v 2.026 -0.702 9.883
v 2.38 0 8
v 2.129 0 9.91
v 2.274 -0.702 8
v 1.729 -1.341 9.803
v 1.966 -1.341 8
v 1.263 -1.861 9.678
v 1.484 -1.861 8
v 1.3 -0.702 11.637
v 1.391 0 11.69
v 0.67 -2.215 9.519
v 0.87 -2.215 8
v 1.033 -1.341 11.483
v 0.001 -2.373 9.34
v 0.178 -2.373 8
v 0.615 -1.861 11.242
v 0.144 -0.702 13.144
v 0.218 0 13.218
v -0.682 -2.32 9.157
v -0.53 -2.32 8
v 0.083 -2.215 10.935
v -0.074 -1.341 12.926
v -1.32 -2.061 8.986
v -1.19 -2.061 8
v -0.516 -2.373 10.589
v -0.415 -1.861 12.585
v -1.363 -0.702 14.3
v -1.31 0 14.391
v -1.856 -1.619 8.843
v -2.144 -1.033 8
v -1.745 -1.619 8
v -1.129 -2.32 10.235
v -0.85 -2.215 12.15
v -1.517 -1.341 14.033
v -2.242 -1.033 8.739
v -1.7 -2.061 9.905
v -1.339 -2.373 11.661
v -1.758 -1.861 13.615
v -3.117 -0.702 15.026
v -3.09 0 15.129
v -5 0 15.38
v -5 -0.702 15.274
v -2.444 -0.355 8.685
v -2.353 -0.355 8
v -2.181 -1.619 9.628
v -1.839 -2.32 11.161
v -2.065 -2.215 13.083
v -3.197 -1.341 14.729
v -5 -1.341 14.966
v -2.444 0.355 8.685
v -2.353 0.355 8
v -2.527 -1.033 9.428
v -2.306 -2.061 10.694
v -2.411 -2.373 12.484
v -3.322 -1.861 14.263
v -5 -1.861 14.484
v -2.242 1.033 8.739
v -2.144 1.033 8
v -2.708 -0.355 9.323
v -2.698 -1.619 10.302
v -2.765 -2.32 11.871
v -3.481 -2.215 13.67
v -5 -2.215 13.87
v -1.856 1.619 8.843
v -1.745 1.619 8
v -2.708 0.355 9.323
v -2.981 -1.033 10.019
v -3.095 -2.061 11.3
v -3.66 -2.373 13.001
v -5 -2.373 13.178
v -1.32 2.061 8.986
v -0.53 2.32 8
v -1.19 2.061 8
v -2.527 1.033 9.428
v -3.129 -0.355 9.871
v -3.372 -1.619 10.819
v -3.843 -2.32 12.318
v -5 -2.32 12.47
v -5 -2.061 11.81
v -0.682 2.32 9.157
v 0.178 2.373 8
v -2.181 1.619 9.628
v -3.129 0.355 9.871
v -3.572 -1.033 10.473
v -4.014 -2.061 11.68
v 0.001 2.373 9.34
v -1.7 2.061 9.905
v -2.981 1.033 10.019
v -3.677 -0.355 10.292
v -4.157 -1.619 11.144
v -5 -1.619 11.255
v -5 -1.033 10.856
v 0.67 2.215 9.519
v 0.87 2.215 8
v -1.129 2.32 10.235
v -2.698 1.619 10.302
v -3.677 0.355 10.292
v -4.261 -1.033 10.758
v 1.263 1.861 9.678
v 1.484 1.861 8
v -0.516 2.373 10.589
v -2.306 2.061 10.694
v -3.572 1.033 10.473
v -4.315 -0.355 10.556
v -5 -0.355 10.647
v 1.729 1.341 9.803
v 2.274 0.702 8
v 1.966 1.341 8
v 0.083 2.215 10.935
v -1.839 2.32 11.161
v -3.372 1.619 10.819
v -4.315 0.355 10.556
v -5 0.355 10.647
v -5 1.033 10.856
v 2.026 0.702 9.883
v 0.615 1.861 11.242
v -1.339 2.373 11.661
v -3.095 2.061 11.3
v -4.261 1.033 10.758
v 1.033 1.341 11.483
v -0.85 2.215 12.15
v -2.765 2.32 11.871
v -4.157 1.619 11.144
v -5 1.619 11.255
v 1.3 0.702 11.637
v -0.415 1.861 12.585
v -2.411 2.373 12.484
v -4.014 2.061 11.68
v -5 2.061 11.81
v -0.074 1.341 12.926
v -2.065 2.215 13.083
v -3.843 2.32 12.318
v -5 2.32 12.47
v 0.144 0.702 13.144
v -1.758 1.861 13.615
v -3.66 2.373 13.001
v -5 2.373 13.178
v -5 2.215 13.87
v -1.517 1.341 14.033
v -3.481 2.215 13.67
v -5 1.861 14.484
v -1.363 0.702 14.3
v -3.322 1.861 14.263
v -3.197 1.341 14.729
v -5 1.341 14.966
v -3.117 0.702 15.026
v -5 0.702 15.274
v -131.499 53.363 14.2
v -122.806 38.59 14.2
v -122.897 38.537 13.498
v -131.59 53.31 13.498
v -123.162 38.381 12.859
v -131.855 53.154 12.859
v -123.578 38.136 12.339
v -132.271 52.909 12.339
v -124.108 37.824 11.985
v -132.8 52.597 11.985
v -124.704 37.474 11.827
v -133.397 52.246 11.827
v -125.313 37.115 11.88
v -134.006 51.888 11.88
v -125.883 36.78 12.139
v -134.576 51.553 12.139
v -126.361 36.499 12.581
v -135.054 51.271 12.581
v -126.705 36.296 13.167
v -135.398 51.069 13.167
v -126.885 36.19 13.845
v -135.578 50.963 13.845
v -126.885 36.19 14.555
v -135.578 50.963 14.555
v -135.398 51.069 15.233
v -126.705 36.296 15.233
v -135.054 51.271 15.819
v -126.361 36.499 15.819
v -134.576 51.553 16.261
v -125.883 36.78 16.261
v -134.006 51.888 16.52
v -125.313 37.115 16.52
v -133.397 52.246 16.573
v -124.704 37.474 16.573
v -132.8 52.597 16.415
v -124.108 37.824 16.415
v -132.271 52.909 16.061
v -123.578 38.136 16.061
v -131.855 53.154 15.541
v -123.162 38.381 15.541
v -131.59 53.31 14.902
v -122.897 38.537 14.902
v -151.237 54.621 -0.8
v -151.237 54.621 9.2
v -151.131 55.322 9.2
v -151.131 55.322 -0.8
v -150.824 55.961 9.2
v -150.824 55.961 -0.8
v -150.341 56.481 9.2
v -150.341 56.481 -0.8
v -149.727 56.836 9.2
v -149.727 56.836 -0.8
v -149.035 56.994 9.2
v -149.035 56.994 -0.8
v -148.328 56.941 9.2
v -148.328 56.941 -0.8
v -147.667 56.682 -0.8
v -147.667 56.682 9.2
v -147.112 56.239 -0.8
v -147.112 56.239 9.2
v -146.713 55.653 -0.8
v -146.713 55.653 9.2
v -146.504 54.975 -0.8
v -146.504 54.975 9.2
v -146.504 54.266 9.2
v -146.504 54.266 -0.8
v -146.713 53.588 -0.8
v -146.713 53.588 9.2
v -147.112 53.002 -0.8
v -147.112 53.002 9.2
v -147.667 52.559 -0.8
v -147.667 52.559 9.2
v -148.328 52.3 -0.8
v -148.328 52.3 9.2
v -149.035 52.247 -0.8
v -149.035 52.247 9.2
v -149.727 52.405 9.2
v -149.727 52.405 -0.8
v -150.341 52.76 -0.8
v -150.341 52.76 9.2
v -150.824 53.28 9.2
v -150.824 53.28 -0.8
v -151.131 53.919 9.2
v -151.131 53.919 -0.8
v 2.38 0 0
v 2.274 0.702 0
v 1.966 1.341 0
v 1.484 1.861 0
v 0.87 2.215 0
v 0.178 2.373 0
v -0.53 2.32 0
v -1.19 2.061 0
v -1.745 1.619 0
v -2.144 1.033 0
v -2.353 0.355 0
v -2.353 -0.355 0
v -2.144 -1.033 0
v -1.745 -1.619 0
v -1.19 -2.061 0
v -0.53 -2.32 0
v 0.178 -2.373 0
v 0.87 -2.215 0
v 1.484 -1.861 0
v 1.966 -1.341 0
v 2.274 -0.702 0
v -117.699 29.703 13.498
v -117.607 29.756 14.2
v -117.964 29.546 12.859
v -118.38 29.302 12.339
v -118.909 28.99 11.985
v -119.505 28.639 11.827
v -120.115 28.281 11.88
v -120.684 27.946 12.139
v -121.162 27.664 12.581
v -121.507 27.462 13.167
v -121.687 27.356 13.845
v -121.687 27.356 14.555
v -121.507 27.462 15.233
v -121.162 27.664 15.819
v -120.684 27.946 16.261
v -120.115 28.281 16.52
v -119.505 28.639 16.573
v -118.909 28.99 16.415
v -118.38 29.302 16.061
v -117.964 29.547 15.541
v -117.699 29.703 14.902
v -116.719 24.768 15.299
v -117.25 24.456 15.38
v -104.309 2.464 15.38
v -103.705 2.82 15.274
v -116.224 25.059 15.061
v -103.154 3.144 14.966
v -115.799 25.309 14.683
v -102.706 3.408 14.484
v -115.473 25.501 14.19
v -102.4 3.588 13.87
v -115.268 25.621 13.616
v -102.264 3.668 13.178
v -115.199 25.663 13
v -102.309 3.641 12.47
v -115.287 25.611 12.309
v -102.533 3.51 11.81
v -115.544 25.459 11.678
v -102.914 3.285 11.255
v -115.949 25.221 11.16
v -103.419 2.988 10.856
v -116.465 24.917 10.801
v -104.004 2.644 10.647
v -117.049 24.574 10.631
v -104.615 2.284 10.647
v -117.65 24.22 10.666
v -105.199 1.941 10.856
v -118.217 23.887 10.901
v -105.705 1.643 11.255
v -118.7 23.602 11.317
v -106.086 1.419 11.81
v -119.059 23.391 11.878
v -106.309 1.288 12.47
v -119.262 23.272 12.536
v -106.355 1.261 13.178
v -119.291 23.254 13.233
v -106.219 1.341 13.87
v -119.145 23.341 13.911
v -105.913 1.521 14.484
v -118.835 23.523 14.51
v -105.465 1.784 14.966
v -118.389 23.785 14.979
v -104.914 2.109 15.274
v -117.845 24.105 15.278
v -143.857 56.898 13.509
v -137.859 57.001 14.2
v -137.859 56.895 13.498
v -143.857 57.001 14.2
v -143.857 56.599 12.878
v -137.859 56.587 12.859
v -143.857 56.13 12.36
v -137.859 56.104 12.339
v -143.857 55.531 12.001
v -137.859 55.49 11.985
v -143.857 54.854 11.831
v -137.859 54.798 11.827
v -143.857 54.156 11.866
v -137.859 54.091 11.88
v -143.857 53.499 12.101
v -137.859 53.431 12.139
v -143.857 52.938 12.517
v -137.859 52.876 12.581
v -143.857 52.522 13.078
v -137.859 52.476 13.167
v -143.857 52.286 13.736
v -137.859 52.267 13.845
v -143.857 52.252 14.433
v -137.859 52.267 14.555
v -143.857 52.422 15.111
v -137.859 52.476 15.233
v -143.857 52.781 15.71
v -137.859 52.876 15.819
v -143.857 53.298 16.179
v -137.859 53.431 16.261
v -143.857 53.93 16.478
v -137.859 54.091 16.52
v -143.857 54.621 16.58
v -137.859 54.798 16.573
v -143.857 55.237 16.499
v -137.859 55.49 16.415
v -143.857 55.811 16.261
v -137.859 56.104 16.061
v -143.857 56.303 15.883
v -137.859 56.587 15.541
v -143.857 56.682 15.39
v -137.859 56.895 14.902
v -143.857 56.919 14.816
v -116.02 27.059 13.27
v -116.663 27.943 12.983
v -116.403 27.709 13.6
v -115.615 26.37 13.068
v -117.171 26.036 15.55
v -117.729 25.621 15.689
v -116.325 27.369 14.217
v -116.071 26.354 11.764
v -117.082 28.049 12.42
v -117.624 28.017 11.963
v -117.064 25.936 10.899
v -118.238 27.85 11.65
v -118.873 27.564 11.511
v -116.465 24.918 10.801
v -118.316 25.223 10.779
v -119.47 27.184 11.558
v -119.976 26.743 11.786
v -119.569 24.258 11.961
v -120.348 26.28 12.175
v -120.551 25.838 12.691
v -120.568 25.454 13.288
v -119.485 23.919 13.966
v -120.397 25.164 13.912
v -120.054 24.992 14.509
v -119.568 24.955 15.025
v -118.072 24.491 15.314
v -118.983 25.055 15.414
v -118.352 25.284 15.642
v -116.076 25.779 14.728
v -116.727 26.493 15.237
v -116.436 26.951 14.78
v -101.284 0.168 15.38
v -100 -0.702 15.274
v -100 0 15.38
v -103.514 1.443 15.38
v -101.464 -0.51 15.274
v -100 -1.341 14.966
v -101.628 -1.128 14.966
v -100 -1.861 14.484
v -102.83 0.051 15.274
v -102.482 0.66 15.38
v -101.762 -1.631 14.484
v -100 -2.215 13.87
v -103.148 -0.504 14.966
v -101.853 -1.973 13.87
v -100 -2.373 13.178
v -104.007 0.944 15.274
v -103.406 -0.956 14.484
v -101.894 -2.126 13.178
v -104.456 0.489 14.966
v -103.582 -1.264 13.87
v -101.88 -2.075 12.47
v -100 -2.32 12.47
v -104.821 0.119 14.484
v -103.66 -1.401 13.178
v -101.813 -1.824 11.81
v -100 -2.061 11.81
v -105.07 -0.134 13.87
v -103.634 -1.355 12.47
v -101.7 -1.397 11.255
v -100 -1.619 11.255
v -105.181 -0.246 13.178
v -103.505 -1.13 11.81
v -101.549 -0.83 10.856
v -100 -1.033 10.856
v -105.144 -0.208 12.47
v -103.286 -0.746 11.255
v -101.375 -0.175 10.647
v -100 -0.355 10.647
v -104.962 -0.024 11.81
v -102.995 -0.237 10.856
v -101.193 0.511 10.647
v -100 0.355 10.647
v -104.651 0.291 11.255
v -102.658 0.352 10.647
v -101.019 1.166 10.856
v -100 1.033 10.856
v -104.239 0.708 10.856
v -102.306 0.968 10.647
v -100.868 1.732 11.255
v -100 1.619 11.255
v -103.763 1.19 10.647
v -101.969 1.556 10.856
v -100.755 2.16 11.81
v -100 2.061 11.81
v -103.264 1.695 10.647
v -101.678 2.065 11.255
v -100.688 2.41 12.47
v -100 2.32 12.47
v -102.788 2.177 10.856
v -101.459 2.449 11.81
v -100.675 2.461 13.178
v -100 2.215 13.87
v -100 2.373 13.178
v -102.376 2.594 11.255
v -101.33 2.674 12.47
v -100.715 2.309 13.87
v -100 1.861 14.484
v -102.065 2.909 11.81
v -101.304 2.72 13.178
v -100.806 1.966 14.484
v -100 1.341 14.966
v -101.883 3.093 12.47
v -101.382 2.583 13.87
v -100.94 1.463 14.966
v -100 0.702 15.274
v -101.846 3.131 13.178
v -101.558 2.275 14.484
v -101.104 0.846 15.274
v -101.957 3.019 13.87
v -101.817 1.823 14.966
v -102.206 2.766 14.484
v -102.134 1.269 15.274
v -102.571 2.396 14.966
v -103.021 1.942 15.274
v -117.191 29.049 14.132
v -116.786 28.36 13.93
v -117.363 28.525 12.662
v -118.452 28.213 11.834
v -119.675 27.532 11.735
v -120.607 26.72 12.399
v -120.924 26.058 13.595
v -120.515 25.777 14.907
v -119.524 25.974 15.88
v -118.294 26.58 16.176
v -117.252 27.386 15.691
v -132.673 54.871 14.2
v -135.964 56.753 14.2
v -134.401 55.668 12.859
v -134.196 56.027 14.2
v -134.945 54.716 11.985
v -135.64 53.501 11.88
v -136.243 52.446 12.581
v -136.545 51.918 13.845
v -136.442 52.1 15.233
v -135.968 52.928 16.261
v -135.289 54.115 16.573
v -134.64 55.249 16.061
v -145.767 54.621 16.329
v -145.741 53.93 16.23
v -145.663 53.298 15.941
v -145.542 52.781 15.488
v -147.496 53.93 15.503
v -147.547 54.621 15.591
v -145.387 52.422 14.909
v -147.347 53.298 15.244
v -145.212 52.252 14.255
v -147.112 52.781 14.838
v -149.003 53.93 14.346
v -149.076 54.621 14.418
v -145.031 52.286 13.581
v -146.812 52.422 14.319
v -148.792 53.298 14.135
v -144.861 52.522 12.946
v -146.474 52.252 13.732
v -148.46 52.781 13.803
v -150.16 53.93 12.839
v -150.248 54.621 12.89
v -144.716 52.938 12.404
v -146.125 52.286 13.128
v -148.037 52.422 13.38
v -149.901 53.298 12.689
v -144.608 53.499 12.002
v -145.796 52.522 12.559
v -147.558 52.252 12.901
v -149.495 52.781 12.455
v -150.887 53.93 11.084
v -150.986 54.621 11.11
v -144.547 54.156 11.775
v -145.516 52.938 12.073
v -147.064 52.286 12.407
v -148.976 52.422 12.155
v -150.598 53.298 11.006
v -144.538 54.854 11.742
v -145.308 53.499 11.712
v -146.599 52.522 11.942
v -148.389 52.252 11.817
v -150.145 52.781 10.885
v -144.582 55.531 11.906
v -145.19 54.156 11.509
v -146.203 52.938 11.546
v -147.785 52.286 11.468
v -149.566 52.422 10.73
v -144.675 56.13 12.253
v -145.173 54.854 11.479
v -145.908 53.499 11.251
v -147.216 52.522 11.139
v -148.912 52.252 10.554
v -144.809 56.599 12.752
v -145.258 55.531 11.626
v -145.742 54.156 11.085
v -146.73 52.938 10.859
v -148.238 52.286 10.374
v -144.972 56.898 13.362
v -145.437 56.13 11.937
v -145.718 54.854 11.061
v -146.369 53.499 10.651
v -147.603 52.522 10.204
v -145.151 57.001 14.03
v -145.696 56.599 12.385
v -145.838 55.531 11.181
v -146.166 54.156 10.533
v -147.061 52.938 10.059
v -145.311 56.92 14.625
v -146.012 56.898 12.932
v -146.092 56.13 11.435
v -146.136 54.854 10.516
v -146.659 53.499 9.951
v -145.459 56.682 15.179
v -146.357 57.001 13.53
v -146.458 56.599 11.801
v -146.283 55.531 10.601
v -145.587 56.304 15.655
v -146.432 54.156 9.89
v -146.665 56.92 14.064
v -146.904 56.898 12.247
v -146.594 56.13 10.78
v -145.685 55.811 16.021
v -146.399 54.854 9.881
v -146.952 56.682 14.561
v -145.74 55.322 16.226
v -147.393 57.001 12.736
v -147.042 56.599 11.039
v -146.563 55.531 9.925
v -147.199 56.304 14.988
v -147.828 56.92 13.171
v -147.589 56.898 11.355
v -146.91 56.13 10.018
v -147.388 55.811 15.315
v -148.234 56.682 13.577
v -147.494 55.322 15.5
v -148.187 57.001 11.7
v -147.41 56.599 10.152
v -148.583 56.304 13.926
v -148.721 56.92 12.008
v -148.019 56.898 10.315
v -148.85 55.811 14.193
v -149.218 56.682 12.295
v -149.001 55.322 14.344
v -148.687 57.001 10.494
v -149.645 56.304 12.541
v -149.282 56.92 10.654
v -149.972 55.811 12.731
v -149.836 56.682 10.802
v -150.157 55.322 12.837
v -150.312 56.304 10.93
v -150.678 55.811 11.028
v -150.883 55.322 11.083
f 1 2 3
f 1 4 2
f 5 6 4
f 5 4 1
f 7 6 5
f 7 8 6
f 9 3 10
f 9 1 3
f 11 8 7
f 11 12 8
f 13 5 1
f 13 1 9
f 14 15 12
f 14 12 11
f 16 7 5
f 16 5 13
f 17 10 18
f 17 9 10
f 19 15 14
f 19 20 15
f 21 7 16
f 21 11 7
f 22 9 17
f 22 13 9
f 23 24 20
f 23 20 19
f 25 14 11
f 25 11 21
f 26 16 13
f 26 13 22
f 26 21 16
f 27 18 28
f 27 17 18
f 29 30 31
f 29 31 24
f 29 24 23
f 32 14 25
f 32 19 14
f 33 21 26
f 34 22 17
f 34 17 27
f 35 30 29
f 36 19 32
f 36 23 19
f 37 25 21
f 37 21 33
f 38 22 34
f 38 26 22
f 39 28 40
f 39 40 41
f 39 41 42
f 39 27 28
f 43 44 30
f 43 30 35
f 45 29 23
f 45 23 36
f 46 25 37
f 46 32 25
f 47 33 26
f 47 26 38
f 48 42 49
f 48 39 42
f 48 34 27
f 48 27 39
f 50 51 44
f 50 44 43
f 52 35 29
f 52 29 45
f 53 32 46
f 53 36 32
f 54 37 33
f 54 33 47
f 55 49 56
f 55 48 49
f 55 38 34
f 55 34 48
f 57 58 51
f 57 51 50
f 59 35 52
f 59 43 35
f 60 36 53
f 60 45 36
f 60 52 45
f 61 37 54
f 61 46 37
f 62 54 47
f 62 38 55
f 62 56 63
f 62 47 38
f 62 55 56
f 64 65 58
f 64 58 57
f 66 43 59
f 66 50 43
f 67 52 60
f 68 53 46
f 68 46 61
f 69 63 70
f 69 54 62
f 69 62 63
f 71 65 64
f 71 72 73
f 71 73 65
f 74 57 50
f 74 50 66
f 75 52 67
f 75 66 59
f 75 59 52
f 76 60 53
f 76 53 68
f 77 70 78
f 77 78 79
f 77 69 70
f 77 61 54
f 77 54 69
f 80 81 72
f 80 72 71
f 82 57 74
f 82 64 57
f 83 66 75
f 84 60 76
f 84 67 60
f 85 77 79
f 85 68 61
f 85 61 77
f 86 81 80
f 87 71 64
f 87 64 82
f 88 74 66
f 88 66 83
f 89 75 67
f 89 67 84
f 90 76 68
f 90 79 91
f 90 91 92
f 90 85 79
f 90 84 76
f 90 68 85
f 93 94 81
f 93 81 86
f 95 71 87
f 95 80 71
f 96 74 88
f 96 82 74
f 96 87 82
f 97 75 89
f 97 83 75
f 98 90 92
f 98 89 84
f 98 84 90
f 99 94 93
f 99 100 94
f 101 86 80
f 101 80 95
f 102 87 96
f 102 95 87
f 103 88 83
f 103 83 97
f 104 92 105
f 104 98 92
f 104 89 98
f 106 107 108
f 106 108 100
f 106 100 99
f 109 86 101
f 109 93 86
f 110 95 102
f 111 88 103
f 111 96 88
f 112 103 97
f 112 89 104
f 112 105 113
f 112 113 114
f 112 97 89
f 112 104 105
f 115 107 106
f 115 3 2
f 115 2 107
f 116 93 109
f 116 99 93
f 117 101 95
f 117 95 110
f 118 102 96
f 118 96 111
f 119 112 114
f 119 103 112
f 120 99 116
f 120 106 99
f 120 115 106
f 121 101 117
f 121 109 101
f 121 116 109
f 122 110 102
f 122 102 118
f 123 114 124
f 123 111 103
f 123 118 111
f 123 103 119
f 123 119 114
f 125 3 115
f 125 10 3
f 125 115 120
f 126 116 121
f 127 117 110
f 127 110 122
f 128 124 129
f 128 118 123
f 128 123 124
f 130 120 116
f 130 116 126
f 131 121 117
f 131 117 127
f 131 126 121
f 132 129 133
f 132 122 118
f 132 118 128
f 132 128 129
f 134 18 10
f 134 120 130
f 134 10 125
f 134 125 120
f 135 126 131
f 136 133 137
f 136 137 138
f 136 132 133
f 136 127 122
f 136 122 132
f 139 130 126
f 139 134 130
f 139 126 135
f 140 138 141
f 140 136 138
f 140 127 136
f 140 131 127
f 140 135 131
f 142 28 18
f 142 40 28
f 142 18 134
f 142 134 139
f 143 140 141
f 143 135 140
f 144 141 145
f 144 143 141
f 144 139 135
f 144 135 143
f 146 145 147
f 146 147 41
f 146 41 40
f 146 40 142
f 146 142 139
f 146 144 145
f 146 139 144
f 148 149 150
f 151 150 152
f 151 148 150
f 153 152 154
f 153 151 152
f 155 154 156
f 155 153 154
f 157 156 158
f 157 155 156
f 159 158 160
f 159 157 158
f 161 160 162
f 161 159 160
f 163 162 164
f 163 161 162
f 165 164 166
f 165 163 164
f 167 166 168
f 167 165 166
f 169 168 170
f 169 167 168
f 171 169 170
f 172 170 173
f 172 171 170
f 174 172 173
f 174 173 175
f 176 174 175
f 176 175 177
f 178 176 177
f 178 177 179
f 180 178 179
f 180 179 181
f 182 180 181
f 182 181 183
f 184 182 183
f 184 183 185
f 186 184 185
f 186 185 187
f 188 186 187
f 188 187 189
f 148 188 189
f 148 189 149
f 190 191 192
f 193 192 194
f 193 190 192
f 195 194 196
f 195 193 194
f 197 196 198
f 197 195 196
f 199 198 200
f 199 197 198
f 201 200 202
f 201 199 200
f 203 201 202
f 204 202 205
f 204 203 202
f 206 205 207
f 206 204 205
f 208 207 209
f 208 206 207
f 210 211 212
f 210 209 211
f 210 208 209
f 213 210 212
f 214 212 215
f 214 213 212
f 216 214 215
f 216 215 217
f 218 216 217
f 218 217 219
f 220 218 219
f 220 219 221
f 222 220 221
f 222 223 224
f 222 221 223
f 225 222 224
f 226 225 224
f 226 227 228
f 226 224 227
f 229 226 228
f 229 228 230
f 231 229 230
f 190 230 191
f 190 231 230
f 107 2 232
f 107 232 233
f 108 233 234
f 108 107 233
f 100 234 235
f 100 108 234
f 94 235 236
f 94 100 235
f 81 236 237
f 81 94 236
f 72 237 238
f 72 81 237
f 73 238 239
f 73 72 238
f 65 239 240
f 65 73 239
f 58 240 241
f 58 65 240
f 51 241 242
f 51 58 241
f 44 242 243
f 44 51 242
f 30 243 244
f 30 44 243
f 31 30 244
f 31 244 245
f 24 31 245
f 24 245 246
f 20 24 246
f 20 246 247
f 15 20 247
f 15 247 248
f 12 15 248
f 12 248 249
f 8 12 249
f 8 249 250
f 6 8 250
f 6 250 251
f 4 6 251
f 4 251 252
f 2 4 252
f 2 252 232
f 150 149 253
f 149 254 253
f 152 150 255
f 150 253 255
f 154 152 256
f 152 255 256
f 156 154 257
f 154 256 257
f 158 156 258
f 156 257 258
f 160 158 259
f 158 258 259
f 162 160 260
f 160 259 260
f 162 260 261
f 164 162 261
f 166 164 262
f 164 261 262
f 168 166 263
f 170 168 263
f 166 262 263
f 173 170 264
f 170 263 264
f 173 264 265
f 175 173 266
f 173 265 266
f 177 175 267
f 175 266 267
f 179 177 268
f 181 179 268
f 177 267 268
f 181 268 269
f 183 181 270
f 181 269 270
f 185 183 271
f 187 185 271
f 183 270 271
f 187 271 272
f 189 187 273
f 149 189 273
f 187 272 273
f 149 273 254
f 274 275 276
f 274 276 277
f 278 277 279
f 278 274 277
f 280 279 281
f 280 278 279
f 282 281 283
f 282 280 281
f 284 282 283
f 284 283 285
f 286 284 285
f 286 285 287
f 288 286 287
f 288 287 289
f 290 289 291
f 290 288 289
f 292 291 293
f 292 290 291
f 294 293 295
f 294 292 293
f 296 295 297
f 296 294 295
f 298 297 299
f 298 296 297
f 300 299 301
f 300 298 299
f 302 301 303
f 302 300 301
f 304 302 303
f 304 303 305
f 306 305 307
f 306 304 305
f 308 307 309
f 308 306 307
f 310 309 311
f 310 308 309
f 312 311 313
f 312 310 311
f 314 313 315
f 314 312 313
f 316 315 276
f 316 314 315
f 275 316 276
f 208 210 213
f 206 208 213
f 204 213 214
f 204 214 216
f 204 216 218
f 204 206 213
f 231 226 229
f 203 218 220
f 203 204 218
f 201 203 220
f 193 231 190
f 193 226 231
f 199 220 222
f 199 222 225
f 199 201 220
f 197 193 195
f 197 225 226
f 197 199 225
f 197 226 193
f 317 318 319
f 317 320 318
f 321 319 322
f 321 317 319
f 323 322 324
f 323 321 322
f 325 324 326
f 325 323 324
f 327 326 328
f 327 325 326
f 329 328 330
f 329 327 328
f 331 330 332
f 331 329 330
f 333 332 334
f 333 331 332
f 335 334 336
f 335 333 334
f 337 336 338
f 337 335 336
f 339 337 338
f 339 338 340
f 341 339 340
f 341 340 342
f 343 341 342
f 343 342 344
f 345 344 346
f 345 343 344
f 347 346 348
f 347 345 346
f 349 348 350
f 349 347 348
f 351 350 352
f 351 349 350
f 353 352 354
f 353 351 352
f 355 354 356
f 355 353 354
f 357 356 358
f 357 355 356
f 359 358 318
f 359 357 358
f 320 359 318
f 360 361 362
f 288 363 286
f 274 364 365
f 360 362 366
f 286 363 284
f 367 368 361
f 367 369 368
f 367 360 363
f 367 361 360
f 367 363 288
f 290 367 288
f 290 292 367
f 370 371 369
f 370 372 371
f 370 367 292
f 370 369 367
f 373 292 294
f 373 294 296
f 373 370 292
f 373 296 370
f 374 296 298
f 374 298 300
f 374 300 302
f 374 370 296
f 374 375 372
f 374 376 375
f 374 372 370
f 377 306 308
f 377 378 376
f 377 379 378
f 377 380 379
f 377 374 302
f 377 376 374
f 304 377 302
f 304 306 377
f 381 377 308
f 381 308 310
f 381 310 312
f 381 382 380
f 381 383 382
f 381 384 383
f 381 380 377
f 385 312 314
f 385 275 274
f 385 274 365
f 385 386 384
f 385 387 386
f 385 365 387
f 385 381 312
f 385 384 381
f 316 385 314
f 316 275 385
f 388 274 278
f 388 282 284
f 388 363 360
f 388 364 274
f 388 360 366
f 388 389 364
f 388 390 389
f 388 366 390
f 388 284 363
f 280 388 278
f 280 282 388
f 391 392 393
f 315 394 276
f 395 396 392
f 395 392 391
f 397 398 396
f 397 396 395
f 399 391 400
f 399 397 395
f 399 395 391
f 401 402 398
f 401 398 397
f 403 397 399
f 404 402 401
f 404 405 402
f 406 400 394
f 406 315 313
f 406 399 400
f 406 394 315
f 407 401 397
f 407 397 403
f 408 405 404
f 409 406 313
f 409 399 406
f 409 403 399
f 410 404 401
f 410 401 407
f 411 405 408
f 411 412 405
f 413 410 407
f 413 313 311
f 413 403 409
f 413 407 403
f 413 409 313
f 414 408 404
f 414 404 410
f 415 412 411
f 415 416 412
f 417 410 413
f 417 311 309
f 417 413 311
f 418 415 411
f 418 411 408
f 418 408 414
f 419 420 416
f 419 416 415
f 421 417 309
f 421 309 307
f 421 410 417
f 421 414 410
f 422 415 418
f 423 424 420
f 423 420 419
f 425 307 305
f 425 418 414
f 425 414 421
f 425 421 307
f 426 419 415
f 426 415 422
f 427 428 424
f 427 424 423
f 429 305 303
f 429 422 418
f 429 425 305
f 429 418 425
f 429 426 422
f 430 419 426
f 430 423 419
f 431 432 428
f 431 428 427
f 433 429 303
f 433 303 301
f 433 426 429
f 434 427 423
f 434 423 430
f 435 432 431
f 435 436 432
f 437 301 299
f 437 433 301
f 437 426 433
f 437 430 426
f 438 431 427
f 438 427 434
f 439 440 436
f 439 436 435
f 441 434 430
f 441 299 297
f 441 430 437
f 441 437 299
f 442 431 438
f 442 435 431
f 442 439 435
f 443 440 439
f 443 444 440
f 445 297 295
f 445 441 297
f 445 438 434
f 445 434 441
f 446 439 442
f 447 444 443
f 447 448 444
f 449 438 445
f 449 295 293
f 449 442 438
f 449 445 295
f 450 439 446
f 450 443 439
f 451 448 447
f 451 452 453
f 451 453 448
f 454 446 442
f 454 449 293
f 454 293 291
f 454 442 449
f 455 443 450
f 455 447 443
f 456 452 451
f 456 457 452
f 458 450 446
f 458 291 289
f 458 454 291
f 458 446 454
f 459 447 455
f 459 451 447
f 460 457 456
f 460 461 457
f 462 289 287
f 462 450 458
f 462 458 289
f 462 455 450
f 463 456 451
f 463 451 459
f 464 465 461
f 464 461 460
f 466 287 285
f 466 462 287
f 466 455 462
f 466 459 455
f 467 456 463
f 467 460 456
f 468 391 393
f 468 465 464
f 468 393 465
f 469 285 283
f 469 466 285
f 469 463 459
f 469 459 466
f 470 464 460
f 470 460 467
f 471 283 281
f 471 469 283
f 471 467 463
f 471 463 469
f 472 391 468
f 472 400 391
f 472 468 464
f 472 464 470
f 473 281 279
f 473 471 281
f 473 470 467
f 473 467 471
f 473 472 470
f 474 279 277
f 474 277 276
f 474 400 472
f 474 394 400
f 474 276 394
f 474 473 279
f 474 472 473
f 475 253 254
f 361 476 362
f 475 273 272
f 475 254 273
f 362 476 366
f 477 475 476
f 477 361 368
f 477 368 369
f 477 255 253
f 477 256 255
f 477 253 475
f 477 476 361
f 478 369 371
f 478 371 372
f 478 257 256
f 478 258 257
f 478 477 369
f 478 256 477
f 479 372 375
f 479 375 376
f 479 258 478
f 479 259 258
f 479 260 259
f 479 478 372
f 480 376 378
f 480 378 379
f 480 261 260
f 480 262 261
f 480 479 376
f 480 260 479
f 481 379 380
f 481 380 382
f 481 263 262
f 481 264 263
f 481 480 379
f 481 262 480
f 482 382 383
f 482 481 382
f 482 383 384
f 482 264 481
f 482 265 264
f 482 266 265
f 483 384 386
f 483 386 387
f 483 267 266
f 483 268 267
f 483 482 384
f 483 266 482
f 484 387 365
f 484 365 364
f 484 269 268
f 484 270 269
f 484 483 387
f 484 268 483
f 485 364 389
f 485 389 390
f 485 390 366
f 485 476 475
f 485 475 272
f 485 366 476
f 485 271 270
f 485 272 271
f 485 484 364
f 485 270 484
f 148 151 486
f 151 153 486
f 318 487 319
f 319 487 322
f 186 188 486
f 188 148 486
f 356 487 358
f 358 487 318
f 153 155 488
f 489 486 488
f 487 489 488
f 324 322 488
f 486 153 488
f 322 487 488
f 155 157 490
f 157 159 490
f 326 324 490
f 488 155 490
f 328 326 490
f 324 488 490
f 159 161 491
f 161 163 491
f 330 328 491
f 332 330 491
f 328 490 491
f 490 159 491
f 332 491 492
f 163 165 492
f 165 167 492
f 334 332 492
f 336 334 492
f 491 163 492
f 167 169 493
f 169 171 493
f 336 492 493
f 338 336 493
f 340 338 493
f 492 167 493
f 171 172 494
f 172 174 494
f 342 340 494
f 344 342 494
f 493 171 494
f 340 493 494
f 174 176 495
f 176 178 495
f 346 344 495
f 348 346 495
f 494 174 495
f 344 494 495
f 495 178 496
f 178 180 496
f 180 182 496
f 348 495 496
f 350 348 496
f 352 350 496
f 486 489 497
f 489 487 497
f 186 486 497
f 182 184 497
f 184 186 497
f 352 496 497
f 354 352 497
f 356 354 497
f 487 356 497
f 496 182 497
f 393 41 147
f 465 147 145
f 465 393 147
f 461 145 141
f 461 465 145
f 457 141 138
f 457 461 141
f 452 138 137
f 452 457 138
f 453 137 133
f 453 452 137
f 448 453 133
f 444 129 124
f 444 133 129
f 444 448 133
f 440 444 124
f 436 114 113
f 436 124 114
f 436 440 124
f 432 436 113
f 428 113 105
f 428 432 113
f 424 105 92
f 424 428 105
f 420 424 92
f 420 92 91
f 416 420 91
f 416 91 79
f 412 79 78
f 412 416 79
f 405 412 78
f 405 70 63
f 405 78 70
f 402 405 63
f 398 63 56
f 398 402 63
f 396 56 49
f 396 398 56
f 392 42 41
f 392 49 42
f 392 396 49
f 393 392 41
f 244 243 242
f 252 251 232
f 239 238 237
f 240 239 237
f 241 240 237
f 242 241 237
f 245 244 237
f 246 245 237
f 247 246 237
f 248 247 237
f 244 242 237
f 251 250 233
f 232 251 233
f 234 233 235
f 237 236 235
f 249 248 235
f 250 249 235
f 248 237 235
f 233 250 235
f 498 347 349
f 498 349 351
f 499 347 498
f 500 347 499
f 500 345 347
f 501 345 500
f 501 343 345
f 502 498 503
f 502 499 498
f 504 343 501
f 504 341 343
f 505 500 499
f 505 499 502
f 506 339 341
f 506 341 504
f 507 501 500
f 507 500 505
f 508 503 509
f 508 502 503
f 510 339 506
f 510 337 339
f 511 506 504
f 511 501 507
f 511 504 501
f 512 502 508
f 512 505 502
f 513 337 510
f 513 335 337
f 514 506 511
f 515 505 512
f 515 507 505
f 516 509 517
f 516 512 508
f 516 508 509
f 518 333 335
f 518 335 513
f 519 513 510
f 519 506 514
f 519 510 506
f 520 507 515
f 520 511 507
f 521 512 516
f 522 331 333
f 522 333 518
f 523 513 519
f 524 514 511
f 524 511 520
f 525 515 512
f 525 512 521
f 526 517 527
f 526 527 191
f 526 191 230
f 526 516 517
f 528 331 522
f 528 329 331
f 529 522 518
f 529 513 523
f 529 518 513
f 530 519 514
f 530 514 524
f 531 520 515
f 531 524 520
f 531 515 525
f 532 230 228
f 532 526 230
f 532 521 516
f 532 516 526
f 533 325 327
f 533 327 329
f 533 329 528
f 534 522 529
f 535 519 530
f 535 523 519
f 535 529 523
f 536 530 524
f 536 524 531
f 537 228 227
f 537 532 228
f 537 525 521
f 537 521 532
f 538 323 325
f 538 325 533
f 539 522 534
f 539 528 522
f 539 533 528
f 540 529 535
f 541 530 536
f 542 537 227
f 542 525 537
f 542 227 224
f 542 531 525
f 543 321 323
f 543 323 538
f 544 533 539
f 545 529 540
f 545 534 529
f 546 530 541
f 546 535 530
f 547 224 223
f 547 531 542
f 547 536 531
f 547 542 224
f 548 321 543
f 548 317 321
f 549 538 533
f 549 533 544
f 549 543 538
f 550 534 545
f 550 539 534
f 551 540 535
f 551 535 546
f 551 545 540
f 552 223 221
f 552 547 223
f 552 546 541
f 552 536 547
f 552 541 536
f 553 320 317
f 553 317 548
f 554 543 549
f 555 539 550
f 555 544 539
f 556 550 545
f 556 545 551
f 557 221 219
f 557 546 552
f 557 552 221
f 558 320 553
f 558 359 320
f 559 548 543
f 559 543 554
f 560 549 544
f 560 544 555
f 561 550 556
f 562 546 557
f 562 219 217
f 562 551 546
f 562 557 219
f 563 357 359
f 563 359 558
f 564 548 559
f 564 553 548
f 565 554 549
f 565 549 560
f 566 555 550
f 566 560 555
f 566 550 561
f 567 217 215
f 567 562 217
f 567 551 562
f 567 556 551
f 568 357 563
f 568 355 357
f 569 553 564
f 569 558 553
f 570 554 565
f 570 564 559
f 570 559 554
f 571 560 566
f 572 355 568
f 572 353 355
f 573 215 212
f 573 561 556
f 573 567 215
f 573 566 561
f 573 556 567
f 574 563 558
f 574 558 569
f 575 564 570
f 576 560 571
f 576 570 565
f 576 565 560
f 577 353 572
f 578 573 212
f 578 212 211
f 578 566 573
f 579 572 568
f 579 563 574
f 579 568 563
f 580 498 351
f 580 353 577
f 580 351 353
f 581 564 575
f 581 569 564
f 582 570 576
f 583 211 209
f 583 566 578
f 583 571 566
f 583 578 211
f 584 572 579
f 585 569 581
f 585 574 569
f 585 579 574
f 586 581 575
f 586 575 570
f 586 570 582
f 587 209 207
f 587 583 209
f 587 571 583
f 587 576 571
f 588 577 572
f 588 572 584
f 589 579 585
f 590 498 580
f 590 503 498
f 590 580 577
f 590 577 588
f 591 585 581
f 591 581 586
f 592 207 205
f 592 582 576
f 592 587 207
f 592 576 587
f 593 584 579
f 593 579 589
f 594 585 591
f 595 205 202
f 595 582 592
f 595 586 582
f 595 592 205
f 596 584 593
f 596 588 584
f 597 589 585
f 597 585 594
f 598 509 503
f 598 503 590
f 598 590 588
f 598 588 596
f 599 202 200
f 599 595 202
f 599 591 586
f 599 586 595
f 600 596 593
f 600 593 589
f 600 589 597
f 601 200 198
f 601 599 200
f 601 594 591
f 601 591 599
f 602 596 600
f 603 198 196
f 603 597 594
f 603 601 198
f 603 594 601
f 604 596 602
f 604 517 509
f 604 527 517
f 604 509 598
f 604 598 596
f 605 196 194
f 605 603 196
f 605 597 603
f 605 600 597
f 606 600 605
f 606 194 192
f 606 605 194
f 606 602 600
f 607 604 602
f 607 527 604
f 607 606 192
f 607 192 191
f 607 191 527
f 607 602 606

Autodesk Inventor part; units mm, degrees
sketch "Sketch1" plane through (0, 0, 0) normal (0, 0, 1) x (1, 0, 0)
  circle A0 centre (0, 0) radius 2.38
  dimension "d0" = 4.76
sketch "Sketch2" plane through (0, 0, 0) normal (0, 1, 0) x (-1, 0, 0)
  line L0 (0, 0) -> (0, 8)
  line L1 (5, 13) -> (100, 13)
  arc A0 (5, 13) -> (0, 8) centre (5, 8) ccw
  point P0 (0, 13)
  dimension "d1" = 13
  dimension "d2" = 100
  dimension "d3" = 5
sweep "Sweep1" add profiles "Sketch1" path "Sketch2"
ref_plane "Work Plane1" through (-5, 0, 13) normal (0, 0, -1) x (-1, 0, 0)
sketch "Sketch3" plane through (-100, 0, 13) normal (-1, 0, 0) x (0, 0, 1)
  circle A0 centre (0, 0) radius 2.38 projected
  point P0 (-13, 0)
sketch "Sketch4" plane through (-5, 0, 13) normal (0, 0, -1) x (-1, 0, 0)
  arc A0 (95, 0) -> (99.3093, 2.4643) centre (95, 5) ccw
  line L0 (95, 2.38) -> (95, -2.38) projected
  line L1 (-5, -14.1885) -> (-5, 68.471) projected
  line L2 (-34.856, 0) -> (157.476, 0) projected
  line L3 (112.2498, 24.4556) -> (99.3093, 2.4643)
  line L4 (130, 54.6206) -> (126.5299, 56.6625)
  point P0 (-5, 0)
  dimension "d6" = 10
  dimension "d11" = 35
  dimension "d44" = 54.6206
  dimension "d45" = 35
sweep "Sweep2" add profiles "Sketch3" path "Sketch4" path curves A0 L3
ref_plane "Work Plane2" through (-104.3093, 2.4643, 13) normal (-0.8618583, -0.5071491, 0) x (-0.5071491, 0.8618583, 0)
sketch "Sketch5" plane through (-117.2498, 24.4556, 13) normal (-0.5071491, 0.8618583, 0) x (0.8618583, 0.5071491, 0)
  circle A0 centre (0, 0) radius 2.38 projected
  point P0 (88.6501, 13)
sketch "Sketch6" plane through (-104.3093, 2.4643, 13) normal (-0.8618583, -0.5071491, 0) x (-0.5071491, 0.8618583, 0)
  line L0 (67.6152, 13) -> (-122.0784, 13) projected
  line L1 (-122.0784, 13) -> (67.6152, 13) projected
  line L2 (67.6152, 13) -> (-122.0784, 13) projected
  line L3 (0, 2.38) -> (0, -2.38) projected
  arc A0 (27.891, -0.6) -> (25.5161, 0) centre (25.5161, -5) ccw
  line L4 (40.5161, -1.2) -> (30.2659, -1.2)
  arc A1 (27.891, -0.6) -> (30.2659, -1.2) centre (30.2659, 3.8) ccw
  line L5 (25.5161, -5) -> (30.2659, 3.8) construction
  line L6 (25.5161, 2.38) -> (25.5161, -2.38) projected
  line L7 (0, 2.38) -> (0, -2.38) projected
  point P0 (-55.0242, 13)
  point P1 (25.5161, 0)
  dimension "d16" = 10
  dimension "d20" = 10
  dimension "d22" = 1.2
  dimension "d23" = 15
sweep "Sweep3" add profiles "Sketch5" path "Sketch6" path curves A0 A1 L4
sketch "Sketch7" plane through (-124.857, 37.3834, 14.2) normal (-0.5071491, 0.8618583, 0) x (0.8618583, 0.5071491, 0)
  circle A0 centre (0, 0) radius 2.38 projected
  point P0 (88.6501, 14.2)
ref_plane "Work Plane3" through (-119.6586, 28.5492, 14.2) normal (0, 0, -1) x (-0.5071491, 0.8618583, 0)
sketch "Sketch8" plane through (-119.6586, 28.5492, 14.2) normal (0, 0, -1) x (-0.5071491, 0.8618583, 0)
  line L0 (-101.837, 116.7703) -> (5.5426, -65.7126) projected
  line L1 (34.7421, -7.6336) -> (31.7003, -2.4643)
  line L2 (10.2503, 2.38) -> (10.2503, -2.38) projected
  line L3 (10.2503, 0) -> (27.391, 0)
  arc A0 (31.7003, -2.4643) -> (27.391, 0) centre (27.391, -5) ccw
  point P0 (-85.2901, 88.6501)
  point P1 (37.2779, -11.9428)
  dimension "d27" = 5
  dimension "d28" = 5
  dimension "d41" = 27.0276
  dimension "d42" = 11.9428
sweep "Sweep4" add profiles "Sketch7" path "Sketch8" path curves L3 A0 L1
ref_plane "Work Plane4" through (-137.8592, 54.6206, 14.2) normal (0, -1, 0) x (-1, 0, 0)
sketch "Sketch10" plane through (-143.8571, 54.6206, 14.2) normal (-1, 0, 0) x (0, 0, 1)
  circle A0 centre (0, 0) radius 2.38 projected
  point P0 (-14.2, -54.6206)
sketch "Sketch11" plane through (-137.8592, 54.6206, 14.2) normal (0, -1, 0) x (-1, 0, 0)
  line L0 (5.9979, 2.38) -> (5.9979, -2.38) projected
  line L1 (-137.8592, -5.856) -> (-137.8592, 18.476) projected
  line L2 (42.4879, 14.2) -> (-170.6938, 14.2) projected
  line L3 (10.9979, 15) -> (10.9979, 5)
  line L4 (5.9979, 0) -> (5.9979, 0)
  arc A0 (5.9979, 0) -> (10.9979, 5) centre (5.9979, 5) ccw
  point P0 (-137.8592, 14.2)
  dimension "d33" = 5
  dimension "d34" = 15
  dimension "d43" = 5
sweep "Sweep5" add profiles "Sketch10" path "Sketch11" path curves L4 A0 L3
ref_plane "Work Plane5" through (-5, 0, 13) normal (0, -1, 0) x (-1, 0, 0)
properties part number "100-09" material "Steel"
